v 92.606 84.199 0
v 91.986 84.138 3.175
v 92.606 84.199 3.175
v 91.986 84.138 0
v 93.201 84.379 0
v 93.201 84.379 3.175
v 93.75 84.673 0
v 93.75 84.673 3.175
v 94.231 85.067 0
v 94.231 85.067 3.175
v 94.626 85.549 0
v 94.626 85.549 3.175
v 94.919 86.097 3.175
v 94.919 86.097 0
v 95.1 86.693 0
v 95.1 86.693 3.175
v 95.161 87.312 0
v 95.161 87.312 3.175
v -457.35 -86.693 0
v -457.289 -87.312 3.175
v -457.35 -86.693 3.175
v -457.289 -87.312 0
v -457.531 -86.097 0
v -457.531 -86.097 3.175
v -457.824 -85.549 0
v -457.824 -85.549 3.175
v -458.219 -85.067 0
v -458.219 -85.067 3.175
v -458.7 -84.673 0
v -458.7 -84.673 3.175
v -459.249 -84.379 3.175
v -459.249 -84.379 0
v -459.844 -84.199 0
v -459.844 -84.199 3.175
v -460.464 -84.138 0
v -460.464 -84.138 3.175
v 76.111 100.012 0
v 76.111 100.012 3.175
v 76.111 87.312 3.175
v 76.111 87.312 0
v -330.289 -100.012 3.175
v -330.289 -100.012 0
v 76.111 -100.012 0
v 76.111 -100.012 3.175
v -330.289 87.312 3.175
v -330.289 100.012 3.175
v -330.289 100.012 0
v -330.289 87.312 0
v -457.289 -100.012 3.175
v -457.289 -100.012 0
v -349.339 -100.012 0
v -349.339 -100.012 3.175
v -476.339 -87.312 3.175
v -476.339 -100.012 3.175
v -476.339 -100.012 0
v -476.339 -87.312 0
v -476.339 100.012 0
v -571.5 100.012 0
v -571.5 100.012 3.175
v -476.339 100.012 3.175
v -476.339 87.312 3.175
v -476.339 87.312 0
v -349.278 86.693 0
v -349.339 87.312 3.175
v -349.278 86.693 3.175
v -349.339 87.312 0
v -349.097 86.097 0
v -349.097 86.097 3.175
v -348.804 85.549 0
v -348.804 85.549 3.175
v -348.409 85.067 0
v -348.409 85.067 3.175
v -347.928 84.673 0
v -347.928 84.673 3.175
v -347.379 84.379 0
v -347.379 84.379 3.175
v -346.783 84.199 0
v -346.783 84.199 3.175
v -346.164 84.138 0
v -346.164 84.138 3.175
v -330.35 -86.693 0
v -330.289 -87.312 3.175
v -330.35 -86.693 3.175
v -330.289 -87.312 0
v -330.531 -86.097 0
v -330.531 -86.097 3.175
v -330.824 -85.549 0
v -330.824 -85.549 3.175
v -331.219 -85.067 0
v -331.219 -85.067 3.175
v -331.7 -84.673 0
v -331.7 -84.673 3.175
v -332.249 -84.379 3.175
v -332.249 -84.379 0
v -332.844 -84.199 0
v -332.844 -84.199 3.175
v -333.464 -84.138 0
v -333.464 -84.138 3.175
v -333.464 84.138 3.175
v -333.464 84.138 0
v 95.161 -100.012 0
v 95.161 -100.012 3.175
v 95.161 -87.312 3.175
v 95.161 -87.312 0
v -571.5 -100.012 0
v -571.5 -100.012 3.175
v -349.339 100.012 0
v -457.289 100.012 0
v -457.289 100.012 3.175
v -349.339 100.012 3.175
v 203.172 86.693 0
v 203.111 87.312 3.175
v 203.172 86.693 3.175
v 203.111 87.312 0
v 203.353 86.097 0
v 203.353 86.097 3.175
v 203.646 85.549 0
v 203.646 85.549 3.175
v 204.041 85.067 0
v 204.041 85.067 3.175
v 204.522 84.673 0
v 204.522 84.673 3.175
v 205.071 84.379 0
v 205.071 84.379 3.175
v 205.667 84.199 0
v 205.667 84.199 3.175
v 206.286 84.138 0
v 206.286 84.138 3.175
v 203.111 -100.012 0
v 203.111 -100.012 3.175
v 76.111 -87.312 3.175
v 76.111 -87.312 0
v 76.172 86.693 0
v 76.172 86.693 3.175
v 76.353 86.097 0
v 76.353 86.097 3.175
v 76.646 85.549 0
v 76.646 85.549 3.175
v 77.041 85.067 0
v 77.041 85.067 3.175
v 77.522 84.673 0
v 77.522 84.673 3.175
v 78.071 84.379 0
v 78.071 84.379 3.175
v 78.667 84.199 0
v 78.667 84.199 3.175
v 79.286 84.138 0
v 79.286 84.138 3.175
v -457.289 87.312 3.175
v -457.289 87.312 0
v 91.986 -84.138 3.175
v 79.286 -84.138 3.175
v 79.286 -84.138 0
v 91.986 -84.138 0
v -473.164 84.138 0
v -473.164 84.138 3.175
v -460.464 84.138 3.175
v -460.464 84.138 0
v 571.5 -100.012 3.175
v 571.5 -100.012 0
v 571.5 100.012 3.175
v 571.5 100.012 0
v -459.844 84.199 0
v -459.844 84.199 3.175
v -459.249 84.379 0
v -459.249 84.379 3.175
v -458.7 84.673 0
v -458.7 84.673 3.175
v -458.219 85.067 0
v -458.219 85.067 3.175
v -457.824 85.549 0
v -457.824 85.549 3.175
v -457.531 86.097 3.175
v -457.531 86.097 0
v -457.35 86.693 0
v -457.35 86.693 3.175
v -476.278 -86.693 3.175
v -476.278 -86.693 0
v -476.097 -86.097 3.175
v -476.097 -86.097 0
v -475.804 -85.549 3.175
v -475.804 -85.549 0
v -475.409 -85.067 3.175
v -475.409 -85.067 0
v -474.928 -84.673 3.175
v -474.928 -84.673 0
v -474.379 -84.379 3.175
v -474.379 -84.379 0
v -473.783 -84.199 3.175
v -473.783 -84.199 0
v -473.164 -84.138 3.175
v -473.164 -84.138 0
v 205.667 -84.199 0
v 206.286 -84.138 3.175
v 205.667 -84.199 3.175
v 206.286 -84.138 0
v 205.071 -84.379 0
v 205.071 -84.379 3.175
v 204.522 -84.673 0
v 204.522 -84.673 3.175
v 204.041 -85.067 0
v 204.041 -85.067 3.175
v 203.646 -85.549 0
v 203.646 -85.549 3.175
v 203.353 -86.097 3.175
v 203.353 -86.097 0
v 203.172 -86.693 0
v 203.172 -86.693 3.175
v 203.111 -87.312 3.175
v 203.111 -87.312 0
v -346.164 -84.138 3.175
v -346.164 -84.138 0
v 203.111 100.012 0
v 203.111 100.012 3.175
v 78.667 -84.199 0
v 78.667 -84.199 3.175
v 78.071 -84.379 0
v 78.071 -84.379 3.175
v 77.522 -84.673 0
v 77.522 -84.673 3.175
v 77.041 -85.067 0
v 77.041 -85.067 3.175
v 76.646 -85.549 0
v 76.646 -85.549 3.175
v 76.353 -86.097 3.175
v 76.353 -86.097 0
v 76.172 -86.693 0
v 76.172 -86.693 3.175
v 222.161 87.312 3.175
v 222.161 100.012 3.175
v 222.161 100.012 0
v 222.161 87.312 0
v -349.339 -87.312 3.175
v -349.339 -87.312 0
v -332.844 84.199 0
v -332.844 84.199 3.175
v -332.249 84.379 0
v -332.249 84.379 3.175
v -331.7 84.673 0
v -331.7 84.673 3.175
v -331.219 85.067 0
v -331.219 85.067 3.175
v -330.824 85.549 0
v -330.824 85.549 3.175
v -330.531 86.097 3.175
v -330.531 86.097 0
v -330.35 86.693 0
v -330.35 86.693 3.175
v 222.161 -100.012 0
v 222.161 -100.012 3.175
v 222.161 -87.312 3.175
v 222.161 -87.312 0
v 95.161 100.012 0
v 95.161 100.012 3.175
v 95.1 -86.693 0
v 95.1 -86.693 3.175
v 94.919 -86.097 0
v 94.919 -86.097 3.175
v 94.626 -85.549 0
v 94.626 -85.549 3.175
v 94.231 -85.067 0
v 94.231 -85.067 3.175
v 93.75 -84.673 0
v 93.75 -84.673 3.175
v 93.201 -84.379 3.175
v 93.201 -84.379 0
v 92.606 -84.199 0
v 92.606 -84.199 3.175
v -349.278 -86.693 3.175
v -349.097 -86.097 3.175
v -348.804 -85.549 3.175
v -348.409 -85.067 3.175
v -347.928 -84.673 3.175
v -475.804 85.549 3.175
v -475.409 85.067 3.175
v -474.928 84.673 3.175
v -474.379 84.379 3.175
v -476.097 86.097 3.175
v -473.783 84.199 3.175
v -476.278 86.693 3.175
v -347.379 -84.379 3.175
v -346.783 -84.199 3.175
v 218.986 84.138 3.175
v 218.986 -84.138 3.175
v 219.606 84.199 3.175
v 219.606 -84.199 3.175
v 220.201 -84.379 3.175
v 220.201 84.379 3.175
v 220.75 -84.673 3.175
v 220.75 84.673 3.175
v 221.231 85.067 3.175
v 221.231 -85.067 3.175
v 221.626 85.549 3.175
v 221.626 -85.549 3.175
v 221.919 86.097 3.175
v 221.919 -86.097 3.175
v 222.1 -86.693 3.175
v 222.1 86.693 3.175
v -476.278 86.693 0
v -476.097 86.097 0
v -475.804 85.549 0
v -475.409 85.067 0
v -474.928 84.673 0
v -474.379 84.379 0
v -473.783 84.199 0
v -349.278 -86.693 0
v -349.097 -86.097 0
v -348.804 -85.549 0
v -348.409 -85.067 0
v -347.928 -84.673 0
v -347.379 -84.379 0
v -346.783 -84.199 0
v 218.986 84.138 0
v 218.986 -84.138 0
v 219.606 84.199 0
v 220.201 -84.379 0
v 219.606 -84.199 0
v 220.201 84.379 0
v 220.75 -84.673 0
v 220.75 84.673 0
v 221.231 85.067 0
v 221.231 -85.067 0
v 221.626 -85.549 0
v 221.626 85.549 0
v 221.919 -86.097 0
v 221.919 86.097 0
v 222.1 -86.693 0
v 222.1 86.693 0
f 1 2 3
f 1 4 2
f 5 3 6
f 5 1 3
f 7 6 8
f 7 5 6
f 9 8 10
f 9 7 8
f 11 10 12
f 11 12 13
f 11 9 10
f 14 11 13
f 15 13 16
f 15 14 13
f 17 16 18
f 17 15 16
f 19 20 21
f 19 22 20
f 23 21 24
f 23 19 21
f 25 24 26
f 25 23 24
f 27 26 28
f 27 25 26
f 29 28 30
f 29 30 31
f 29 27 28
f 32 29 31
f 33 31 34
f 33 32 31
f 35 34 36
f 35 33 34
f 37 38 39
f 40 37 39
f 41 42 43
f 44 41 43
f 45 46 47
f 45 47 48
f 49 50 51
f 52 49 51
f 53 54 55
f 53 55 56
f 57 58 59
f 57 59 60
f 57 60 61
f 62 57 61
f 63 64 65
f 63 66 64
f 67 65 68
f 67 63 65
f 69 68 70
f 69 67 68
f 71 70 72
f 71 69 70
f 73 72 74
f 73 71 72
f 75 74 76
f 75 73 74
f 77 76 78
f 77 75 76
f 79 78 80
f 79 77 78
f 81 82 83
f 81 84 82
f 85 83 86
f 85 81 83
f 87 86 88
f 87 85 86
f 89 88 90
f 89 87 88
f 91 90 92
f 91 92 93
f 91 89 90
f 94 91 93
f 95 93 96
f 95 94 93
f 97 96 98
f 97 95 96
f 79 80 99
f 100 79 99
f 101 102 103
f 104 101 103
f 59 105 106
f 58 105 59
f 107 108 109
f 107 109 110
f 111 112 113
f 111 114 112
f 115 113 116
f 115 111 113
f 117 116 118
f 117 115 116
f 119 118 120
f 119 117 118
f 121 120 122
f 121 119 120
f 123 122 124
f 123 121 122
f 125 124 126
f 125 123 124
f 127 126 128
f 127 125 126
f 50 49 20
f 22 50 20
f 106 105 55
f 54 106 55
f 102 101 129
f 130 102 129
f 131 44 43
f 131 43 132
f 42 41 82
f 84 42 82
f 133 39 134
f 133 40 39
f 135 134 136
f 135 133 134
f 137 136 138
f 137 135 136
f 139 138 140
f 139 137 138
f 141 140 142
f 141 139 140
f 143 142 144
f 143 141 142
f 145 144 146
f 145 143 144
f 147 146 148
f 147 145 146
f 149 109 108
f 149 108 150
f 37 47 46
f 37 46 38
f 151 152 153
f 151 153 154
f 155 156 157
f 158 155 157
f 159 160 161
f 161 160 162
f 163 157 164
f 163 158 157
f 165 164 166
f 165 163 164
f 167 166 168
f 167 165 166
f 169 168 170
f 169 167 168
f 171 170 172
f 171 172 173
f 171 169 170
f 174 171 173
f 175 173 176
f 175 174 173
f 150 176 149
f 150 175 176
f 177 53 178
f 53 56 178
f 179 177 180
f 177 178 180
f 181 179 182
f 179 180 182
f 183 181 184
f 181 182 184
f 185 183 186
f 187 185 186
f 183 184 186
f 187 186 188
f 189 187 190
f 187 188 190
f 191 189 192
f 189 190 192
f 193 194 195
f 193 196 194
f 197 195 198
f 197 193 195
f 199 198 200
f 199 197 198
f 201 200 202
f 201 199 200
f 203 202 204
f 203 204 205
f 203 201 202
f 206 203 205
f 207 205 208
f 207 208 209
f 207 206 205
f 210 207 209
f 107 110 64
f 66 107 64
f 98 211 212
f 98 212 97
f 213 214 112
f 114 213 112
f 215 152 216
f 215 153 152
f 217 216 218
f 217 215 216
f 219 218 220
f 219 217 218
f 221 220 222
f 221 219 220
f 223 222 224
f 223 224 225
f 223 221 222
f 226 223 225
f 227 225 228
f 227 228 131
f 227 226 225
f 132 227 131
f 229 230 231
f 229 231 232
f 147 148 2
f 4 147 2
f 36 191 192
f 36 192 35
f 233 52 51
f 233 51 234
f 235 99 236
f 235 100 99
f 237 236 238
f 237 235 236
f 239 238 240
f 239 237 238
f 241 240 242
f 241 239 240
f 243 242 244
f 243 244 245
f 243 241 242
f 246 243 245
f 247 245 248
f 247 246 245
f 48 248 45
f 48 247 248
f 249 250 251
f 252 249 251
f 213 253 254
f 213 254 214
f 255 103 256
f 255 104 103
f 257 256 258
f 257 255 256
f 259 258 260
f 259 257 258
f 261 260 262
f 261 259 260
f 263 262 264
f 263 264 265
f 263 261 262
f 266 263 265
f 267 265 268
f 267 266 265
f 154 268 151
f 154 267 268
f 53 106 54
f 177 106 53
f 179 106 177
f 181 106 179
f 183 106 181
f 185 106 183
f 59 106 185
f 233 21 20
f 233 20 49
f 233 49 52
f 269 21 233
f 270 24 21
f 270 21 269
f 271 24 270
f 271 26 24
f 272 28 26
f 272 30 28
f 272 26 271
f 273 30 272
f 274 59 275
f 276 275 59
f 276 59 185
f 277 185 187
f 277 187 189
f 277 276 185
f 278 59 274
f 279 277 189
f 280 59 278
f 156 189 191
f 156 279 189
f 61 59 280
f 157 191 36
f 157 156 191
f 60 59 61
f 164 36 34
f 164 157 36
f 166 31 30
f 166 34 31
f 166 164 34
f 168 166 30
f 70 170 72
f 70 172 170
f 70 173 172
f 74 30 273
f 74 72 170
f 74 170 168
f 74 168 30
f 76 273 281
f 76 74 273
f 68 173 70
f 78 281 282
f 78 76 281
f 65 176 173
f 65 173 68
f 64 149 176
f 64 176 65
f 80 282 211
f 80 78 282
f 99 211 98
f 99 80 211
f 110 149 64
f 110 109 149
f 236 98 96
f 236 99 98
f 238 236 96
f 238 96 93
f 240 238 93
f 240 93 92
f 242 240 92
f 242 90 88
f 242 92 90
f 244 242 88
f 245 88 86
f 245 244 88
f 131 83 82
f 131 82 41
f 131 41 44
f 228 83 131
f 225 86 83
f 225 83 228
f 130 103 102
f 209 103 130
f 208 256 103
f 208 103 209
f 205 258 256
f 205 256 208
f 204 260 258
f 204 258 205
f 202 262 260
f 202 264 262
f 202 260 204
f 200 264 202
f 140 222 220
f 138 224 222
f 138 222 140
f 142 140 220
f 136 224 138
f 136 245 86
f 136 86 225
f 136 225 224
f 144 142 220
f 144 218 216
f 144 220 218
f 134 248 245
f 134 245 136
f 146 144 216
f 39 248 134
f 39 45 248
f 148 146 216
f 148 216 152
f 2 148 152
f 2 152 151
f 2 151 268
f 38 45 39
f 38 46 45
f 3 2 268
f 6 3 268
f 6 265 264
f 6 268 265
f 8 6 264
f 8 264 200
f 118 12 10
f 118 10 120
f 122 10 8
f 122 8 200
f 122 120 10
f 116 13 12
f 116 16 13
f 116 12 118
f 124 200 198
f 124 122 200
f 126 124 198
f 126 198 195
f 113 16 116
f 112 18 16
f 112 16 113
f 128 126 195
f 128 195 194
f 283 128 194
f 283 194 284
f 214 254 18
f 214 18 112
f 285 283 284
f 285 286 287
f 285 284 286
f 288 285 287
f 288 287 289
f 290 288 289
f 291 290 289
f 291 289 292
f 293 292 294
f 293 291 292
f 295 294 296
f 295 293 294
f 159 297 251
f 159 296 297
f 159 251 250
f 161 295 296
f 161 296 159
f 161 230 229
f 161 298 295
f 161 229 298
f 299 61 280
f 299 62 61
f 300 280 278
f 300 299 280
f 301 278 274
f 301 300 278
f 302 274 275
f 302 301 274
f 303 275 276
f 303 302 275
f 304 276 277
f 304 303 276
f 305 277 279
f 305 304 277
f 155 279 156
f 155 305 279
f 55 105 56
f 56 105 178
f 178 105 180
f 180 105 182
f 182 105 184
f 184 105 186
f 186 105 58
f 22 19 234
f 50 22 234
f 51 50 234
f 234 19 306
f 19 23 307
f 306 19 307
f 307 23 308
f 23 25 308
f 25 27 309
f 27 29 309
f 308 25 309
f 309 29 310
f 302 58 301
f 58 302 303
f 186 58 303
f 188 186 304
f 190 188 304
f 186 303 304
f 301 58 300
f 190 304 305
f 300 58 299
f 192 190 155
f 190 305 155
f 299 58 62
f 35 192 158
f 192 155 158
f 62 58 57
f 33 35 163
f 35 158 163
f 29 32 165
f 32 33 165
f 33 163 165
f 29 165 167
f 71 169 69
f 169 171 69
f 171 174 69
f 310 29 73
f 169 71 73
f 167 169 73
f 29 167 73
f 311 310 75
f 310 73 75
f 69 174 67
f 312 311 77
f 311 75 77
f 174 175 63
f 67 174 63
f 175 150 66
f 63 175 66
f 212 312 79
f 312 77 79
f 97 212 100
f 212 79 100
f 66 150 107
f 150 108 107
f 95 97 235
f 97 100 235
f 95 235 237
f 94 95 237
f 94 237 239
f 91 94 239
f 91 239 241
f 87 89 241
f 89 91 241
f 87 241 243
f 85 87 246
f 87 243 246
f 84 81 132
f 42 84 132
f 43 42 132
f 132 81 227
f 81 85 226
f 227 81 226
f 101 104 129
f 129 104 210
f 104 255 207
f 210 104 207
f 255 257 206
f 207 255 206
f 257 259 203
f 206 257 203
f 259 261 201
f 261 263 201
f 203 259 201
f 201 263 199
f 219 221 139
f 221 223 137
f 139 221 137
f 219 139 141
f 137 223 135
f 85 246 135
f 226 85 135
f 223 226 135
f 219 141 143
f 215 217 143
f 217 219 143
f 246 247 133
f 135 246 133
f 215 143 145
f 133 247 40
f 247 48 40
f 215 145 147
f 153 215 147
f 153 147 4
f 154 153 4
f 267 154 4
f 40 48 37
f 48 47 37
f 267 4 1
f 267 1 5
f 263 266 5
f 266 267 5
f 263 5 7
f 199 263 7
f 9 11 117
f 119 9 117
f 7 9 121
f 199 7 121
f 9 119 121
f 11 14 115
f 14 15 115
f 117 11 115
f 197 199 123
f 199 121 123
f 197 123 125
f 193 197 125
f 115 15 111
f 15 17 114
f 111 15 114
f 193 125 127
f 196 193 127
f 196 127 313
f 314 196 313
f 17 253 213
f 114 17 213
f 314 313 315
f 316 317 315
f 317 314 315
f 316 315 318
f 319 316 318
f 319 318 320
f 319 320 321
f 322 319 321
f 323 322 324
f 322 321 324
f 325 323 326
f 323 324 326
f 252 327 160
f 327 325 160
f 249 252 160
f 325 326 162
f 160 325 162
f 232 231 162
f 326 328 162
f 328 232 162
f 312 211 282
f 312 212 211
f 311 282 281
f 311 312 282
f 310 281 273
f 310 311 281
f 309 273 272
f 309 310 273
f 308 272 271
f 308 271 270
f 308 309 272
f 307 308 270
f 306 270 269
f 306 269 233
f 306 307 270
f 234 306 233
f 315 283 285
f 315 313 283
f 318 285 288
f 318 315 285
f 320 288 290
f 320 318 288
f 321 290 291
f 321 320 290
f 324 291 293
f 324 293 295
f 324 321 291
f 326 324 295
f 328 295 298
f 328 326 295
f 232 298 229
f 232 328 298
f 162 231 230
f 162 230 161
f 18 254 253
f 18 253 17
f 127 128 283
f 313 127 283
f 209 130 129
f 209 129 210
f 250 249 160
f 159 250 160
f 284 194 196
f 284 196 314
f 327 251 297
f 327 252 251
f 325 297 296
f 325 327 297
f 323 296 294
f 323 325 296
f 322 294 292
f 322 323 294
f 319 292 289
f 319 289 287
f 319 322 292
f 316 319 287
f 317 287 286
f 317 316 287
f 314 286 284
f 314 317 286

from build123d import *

# Parameters (mm, degrees)
SKETCH1_W            = 1143
SKETCH1_H            = 200.025
BOSS_EXTRUDE1_DEPTH  = 3.175
SKETCH3_W            = 19.05
SKETCH3_H            = 15.875
CUT_EXTRUDE1_DEPTH   = 4.175
FILLET1_R            = 3.175
FILLET1_OF_MIRROR2_R = 3.175


with BuildPart() as part:
    # Sketch1 → Boss-Extrude1 (new body)
    with BuildSketch(Plane.XY):
        Rectangle(SKETCH1_W, SKETCH1_H)
    extrude(amount=BOSS_EXTRUDE1_DEPTH)

    # Sketch3 → Cut-Extrude1 (cut, through all)
    with BuildSketch(Plane.XY.offset(3.175)):
        with Locations((-466.8139, -92.075)):
            Rectangle(SKETCH3_W, SKETCH3_H)
        with Locations((-339.8139, -92.075)):
            Rectangle(SKETCH3_W, SKETCH3_H)
        with Locations((85.6361, -92.075)):
            Rectangle(SKETCH3_W, SKETCH3_H)
        with Locations((212.6361, -92.075)):
            Rectangle(SKETCH3_W, SKETCH3_H)
    cut_extrude1 = extrude(amount=-CUT_EXTRUDE1_DEPTH, mode=Mode.SUBTRACT)

    # Fillet1
    fillet1_edges = [part.edges().sort_by_distance(p)[0] for p in [
        (-476.3389, -84.1375, 1.5875),
        (-457.2889, -84.1375, 1.5875),
        (-349.3389, -84.1375, 1.5875),
        (-330.2889, -84.1375, 1.5875),
        (76.1111, -84.1375, 1.5875),
        (95.1611, -84.1375, 1.5875),
        (203.1111, -84.1375, 1.5875),
        (222.1611, -84.1375, 1.5875),
    ]]
    fillet(fillet1_edges, radius=FILLET1_R)

    # Mirror2: Cut-Extrude1 across plane
    add(cut_extrude1.mirror(Plane.ZX), mode=Mode.SUBTRACT)

    # Fillet1 of Mirror2
    fillet1_of_mirror2_edges = [part.edges().sort_by_distance(p)[0] for p in [
        (-476.3389, 84.1375, 1.5875),
        (-457.2889, 84.1375, 1.5875),
        (-349.3389, 84.1375, 1.5875),
        (-330.2889, 84.1375, 1.5875),
        (76.1111, 84.1375, 1.5875),
        (95.1611, 84.1375, 1.5875),
        (203.1111, 84.1375, 1.5875),
        (222.1611, 84.1375, 1.5875),
    ]]
    fillet(fillet1_of_mirror2_edges, radius=FILLET1_OF_MIRROR2_R)


solid = part.part
